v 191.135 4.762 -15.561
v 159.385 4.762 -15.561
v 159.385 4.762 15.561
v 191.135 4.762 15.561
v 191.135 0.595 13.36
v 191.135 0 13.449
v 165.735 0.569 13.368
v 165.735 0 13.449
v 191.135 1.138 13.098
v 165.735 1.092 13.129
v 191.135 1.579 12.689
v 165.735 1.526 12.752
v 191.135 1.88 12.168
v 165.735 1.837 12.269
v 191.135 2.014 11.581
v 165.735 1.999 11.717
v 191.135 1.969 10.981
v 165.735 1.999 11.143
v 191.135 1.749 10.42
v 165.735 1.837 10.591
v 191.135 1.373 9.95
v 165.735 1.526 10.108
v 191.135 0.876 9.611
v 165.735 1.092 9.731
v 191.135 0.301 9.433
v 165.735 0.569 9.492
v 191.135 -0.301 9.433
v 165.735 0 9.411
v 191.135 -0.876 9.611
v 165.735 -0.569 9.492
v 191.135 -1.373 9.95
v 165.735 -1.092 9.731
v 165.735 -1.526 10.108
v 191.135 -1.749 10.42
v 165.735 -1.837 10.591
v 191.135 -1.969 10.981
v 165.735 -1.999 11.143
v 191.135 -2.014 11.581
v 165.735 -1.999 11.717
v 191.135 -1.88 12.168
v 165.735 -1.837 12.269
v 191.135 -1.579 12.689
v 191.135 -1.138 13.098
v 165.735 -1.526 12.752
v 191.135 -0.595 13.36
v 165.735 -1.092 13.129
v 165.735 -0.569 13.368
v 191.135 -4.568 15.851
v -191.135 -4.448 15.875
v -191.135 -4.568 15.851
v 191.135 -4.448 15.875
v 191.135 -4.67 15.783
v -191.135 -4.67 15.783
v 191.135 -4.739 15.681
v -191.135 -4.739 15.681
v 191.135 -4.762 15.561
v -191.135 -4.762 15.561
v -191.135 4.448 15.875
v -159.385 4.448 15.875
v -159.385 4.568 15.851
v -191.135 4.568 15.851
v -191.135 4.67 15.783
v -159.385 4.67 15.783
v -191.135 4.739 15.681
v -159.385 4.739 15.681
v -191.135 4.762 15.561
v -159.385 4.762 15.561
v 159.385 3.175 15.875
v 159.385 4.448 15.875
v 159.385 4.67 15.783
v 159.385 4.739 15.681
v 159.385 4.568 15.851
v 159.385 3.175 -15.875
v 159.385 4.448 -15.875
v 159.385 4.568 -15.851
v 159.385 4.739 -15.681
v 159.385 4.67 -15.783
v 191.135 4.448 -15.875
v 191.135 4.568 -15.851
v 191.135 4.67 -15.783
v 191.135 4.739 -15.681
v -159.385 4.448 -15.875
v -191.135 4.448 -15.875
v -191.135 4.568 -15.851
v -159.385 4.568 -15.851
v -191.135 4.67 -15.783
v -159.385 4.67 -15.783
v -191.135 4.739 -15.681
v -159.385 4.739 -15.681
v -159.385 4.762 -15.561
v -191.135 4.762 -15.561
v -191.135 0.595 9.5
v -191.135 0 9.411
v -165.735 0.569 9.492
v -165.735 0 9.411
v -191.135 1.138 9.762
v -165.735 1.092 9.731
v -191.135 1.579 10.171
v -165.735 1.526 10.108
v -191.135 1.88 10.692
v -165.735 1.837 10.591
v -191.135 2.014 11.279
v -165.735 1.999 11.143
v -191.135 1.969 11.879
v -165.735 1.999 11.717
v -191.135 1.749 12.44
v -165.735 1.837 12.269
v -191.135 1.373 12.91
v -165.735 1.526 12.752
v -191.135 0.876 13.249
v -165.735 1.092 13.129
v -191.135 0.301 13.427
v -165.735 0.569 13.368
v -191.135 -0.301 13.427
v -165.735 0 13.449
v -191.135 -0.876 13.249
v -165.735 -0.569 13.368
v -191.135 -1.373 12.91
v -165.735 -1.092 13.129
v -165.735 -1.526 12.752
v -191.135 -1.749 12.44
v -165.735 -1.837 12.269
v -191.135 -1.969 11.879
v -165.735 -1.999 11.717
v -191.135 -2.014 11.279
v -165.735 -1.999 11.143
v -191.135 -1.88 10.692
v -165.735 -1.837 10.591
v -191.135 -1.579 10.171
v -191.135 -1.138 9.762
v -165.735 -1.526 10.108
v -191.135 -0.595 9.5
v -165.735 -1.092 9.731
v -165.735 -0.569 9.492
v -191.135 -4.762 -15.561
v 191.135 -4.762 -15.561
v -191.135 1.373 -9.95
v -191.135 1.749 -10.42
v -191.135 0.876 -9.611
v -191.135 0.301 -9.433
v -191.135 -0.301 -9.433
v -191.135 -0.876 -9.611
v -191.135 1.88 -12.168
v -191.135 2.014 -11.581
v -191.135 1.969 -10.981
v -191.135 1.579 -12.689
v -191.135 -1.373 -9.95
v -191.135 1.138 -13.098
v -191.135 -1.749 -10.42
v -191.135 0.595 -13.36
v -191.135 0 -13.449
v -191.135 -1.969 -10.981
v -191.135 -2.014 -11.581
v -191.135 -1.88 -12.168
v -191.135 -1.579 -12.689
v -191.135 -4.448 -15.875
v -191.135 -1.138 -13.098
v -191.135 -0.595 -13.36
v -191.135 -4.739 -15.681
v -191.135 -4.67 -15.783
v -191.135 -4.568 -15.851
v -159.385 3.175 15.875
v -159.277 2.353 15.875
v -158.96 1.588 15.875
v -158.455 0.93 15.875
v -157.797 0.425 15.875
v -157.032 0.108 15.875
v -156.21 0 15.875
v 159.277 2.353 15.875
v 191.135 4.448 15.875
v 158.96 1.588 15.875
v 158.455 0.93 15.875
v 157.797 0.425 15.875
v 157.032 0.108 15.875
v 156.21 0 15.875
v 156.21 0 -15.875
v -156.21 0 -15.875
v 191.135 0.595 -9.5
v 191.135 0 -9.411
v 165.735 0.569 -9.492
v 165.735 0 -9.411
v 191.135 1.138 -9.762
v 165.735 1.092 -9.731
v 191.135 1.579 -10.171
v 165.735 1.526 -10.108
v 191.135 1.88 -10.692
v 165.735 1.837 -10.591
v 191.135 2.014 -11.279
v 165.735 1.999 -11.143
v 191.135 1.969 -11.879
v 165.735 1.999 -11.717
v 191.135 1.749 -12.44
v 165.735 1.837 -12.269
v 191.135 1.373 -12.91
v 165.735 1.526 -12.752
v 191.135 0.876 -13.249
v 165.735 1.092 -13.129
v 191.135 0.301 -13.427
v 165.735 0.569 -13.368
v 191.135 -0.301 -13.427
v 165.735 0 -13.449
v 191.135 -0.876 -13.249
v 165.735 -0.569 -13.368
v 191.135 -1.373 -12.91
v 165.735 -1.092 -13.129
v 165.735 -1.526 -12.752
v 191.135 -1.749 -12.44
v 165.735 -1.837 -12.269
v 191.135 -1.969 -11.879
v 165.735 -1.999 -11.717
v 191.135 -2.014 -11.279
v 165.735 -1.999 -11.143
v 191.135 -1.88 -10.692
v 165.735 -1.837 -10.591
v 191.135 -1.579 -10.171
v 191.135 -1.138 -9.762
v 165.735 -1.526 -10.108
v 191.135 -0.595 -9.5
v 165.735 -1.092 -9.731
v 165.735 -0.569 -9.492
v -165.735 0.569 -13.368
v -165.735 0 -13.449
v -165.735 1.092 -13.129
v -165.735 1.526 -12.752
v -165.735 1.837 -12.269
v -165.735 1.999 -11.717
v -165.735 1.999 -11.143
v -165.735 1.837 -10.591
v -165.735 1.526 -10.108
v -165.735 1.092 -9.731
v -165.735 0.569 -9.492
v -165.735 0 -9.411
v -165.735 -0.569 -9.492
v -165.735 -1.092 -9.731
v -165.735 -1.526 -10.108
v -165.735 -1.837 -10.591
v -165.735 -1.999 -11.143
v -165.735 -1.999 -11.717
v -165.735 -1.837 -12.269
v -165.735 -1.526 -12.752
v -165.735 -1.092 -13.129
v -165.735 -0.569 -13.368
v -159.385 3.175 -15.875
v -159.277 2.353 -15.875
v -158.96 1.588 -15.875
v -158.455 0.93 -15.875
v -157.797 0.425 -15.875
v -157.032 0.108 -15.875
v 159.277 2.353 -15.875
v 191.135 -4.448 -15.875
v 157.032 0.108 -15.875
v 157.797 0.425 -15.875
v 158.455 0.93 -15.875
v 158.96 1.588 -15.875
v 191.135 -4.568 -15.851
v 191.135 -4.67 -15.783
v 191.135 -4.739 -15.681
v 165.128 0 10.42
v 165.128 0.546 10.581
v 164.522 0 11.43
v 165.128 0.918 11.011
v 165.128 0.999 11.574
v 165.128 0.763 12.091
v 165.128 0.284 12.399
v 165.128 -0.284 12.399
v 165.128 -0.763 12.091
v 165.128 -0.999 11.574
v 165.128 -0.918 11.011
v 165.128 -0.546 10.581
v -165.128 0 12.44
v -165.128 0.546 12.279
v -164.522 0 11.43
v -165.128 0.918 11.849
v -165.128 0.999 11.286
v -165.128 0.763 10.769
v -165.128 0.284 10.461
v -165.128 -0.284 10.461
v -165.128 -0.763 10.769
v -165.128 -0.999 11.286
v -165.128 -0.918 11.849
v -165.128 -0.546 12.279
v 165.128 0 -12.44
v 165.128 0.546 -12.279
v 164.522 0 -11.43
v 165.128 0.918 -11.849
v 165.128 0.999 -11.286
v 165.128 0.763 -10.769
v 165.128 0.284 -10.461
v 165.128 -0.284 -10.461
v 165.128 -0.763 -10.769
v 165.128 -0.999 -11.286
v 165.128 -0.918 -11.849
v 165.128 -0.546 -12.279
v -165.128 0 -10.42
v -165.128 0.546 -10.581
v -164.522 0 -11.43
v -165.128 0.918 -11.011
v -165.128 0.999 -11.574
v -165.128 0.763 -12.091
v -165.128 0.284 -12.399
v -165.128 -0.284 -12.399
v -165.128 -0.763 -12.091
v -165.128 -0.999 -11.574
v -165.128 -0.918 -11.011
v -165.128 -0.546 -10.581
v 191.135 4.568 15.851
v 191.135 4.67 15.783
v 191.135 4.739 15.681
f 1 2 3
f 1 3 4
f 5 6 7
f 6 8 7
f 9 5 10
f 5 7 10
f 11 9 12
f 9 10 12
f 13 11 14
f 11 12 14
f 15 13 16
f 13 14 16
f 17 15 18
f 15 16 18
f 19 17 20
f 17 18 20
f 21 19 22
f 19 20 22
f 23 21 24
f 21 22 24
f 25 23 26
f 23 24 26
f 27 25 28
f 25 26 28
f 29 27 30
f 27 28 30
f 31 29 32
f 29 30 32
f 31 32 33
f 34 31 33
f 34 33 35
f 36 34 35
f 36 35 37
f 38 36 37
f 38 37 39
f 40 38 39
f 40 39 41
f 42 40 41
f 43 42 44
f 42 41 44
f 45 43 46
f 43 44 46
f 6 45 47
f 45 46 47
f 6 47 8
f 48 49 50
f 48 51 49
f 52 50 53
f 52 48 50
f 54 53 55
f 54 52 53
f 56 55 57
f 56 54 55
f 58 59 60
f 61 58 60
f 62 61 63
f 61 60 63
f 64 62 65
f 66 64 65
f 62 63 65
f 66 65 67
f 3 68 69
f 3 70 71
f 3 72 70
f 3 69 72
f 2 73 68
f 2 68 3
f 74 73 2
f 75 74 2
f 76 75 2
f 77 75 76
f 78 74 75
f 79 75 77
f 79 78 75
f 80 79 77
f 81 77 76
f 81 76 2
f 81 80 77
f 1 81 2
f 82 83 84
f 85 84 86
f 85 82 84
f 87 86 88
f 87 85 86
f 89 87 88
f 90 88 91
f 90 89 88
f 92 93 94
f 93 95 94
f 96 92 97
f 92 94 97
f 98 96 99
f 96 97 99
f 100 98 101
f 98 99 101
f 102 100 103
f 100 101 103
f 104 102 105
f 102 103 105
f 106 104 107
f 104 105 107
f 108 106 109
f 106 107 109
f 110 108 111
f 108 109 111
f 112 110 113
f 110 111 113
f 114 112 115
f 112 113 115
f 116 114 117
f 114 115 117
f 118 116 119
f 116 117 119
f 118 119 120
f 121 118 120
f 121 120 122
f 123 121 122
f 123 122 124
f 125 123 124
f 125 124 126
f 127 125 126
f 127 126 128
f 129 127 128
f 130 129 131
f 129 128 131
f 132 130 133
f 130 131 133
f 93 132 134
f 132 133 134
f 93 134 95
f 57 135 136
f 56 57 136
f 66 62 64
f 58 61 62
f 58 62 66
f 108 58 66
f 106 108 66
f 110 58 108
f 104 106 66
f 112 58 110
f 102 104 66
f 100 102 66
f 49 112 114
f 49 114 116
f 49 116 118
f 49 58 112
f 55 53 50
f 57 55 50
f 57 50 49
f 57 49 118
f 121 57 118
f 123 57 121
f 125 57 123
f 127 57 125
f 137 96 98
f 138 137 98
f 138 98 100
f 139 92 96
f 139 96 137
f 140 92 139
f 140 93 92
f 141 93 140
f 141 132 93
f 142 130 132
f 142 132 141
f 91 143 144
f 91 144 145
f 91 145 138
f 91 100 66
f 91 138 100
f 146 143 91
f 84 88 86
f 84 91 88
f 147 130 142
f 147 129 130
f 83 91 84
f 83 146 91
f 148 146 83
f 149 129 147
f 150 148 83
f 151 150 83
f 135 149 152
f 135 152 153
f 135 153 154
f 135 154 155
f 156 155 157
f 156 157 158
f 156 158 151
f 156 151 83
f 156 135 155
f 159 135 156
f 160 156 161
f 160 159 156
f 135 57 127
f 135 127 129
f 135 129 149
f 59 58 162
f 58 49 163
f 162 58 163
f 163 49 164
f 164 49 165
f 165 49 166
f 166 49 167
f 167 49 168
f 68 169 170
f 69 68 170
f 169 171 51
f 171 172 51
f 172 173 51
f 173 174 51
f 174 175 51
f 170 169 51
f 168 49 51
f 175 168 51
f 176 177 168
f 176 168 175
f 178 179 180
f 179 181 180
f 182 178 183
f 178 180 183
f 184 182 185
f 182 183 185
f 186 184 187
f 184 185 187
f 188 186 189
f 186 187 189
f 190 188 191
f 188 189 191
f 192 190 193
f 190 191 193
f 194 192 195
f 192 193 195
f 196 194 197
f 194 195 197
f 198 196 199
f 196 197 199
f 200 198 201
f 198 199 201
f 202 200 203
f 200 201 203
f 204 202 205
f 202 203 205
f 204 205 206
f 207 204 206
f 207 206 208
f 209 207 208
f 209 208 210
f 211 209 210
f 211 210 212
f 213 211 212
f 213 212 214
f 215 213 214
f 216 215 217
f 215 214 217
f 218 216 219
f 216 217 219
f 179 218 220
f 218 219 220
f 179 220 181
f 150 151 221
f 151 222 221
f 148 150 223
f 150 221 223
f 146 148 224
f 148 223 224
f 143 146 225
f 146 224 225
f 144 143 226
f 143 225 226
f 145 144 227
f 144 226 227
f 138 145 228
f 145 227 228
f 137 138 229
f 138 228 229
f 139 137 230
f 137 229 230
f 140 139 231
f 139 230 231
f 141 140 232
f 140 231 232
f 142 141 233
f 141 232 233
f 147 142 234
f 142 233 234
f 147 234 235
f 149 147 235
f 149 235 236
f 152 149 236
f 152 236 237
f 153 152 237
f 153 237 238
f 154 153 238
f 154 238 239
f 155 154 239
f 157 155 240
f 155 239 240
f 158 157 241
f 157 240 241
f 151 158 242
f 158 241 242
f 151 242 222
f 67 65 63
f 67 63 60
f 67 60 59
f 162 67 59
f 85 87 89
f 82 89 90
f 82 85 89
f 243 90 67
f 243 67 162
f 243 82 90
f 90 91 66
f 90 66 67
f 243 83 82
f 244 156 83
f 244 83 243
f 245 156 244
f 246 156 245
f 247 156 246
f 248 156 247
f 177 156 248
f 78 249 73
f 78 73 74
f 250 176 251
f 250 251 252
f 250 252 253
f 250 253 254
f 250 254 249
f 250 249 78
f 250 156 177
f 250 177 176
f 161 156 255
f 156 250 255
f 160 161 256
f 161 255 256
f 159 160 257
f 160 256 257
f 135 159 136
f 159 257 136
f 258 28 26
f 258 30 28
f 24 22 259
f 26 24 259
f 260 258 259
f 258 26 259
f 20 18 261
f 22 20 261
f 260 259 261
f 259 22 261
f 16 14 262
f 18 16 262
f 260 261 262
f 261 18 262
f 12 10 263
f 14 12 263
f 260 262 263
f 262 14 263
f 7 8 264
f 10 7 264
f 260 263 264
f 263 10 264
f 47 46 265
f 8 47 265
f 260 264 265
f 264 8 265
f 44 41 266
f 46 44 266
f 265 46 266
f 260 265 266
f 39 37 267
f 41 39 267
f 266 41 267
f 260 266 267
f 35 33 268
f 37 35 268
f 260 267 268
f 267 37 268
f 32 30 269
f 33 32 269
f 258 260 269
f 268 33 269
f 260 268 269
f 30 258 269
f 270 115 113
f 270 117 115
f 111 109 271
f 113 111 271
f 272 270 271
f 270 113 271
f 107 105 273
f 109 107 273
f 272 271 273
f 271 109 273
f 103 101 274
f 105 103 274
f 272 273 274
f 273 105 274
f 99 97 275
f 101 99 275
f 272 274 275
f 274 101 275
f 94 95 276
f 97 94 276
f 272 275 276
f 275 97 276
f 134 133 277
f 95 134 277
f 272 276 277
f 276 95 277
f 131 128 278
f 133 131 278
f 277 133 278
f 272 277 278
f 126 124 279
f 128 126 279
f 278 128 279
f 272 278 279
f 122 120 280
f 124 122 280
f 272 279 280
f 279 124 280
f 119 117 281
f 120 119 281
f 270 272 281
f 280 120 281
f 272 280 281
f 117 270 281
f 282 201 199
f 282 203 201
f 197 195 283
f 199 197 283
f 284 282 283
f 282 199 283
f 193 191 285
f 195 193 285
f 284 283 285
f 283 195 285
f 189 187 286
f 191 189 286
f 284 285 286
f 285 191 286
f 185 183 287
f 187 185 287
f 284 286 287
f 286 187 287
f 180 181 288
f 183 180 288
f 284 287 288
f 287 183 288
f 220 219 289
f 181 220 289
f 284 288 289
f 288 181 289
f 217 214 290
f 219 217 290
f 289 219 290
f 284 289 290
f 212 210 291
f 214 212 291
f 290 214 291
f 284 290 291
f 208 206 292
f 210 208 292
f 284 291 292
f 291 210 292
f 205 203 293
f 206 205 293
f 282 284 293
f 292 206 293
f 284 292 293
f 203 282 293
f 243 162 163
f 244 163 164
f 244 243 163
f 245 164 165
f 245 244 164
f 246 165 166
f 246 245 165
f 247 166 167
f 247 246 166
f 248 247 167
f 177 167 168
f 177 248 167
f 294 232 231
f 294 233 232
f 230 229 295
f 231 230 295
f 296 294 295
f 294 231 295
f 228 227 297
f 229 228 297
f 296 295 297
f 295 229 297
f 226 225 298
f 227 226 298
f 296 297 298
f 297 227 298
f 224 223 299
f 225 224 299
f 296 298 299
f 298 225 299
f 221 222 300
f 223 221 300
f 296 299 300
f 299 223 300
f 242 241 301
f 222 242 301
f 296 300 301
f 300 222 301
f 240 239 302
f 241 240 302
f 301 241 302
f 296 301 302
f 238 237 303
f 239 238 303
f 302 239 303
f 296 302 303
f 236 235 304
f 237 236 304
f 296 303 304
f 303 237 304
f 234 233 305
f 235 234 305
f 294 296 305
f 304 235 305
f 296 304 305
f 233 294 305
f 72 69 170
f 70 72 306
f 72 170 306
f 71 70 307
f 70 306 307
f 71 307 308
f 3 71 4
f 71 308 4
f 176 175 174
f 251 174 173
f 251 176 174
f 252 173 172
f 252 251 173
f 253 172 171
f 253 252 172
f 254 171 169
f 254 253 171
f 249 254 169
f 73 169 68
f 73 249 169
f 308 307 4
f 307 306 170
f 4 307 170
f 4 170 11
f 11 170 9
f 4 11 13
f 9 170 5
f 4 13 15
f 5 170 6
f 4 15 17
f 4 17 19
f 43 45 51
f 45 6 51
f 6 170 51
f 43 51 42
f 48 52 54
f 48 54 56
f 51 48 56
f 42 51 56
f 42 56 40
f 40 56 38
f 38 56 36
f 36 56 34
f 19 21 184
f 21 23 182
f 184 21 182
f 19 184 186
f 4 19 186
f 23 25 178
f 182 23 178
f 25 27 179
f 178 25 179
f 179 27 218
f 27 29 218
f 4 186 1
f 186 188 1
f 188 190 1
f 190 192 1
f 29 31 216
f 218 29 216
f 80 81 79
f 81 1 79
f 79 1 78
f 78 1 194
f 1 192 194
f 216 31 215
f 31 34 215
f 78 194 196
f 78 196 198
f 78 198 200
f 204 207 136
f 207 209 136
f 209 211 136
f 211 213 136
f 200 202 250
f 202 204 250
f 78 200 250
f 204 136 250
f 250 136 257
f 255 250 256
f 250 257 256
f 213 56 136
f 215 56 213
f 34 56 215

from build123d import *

# Parameters (mm, degrees)
BOSS_EXTRUDE1_DEPTH            = 4.7625
BOSS_EXTRUDE1_DEPTH_BACK       = 4.7625
SKETCH3_W                      = 382.27
SKETCH3_H                      = 31.75
FILLET1_R                      = 0.314325
TAP_DRILL_FOR_10_32_TAP1_D     = 4.0386
TAP_DRILL_FOR_10_32_TAP1_DEPTH = 25.4
TAP_DRILL_FOR_10_32_TAP1_TIP   = 1.213317848
TAP_DRILL_FOR_10_32_TAP2_D     = 4.0386
TAP_DRILL_FOR_10_32_TAP2_DEPTH = 25.4
TAP_DRILL_FOR_10_32_TAP2_TIP   = 1.213317848
CUT_EXTRUDE1_DEPTH             = 194.812621187


with BuildPart() as part:
    # Sketch3 → Boss-Extrude1 (new, two sides: drawn at the far end of the back side and taken through both)
    with BuildSketch(Plane(origin=(0, 0, 0), x_dir=(1, 0, 0), z_dir=(0, 1, 0)).offset(-BOSS_EXTRUDE1_DEPTH_BACK)):
        Rectangle(SKETCH3_W, SKETCH3_H)
    extrude(amount=BOSS_EXTRUDE1_DEPTH + BOSS_EXTRUDE1_DEPTH_BACK)

    # Fillet1
    fillet1_edges = [part.edges().sort_by_distance(p)[0] for p in [
        (0, 4.7625, 15.875),
        (0, -4.7625, -15.875),
        (0, 4.7625, -15.875),
        (0, -4.7625, 15.875),
    ]]
    fillet(fillet1_edges, radius=FILLET1_R)

    # Tap Drill for #10-32 Tap1
    with Locations(Plane.ZY.offset(191.135)):
        with Locations((-11.43, 0), (11.43, 0)):
            Hole(TAP_DRILL_FOR_10_32_TAP1_D / 2, depth=TAP_DRILL_FOR_10_32_TAP1_DEPTH)
            with Locations((0, 0, -(TAP_DRILL_FOR_10_32_TAP1_DEPTH + TAP_DRILL_FOR_10_32_TAP1_TIP / 2))):  # 118° drill point
                Cone(0, TAP_DRILL_FOR_10_32_TAP1_D / 2, TAP_DRILL_FOR_10_32_TAP1_TIP, mode=Mode.SUBTRACT)

    # Tap Drill for #10-32 Tap2
    with Locations(Plane(origin=(191.135, 0, 0), x_dir=(0, 0, -1), z_dir=(1, 0, 0))):
        with Locations((-11.43, 0), (11.43, 0)):
            Hole(TAP_DRILL_FOR_10_32_TAP2_D / 2, depth=TAP_DRILL_FOR_10_32_TAP2_DEPTH)
            with Locations((0, 0, -(TAP_DRILL_FOR_10_32_TAP2_DEPTH + TAP_DRILL_FOR_10_32_TAP2_TIP / 2))):  # 118° drill point
                Cone(0, TAP_DRILL_FOR_10_32_TAP2_D / 2, TAP_DRILL_FOR_10_32_TAP2_TIP, mode=Mode.SUBTRACT)

    # Sketch9 → Cut-Extrude1 (cut, through all)
    with BuildSketch(Plane(origin=(0, 0, -15.875), x_dir=(-1, 0, 0), z_dir=(0, 0, -1))):
        with BuildLine():
            Line((159.385, 4.7625), (159.385, 3.175))
            ThreePointArc((159.385, 3.175), (158.45506403, 0.92993597), (156.21, 0))
            Line((156.21, 0), (-156.21, 0))
            ThreePointArc((-156.21, 0), (-158.45506403, 0.92993597), (-159.385, 3.175))
            Line((-159.385, 3.175), (-159.385, 4.7625))
            Line((-159.385, 4.7625), (159.385, 4.7625))
        make_face()
    extrude(amount=-CUT_EXTRUDE1_DEPTH, mode=Mode.SUBTRACT)


solid = part.part
